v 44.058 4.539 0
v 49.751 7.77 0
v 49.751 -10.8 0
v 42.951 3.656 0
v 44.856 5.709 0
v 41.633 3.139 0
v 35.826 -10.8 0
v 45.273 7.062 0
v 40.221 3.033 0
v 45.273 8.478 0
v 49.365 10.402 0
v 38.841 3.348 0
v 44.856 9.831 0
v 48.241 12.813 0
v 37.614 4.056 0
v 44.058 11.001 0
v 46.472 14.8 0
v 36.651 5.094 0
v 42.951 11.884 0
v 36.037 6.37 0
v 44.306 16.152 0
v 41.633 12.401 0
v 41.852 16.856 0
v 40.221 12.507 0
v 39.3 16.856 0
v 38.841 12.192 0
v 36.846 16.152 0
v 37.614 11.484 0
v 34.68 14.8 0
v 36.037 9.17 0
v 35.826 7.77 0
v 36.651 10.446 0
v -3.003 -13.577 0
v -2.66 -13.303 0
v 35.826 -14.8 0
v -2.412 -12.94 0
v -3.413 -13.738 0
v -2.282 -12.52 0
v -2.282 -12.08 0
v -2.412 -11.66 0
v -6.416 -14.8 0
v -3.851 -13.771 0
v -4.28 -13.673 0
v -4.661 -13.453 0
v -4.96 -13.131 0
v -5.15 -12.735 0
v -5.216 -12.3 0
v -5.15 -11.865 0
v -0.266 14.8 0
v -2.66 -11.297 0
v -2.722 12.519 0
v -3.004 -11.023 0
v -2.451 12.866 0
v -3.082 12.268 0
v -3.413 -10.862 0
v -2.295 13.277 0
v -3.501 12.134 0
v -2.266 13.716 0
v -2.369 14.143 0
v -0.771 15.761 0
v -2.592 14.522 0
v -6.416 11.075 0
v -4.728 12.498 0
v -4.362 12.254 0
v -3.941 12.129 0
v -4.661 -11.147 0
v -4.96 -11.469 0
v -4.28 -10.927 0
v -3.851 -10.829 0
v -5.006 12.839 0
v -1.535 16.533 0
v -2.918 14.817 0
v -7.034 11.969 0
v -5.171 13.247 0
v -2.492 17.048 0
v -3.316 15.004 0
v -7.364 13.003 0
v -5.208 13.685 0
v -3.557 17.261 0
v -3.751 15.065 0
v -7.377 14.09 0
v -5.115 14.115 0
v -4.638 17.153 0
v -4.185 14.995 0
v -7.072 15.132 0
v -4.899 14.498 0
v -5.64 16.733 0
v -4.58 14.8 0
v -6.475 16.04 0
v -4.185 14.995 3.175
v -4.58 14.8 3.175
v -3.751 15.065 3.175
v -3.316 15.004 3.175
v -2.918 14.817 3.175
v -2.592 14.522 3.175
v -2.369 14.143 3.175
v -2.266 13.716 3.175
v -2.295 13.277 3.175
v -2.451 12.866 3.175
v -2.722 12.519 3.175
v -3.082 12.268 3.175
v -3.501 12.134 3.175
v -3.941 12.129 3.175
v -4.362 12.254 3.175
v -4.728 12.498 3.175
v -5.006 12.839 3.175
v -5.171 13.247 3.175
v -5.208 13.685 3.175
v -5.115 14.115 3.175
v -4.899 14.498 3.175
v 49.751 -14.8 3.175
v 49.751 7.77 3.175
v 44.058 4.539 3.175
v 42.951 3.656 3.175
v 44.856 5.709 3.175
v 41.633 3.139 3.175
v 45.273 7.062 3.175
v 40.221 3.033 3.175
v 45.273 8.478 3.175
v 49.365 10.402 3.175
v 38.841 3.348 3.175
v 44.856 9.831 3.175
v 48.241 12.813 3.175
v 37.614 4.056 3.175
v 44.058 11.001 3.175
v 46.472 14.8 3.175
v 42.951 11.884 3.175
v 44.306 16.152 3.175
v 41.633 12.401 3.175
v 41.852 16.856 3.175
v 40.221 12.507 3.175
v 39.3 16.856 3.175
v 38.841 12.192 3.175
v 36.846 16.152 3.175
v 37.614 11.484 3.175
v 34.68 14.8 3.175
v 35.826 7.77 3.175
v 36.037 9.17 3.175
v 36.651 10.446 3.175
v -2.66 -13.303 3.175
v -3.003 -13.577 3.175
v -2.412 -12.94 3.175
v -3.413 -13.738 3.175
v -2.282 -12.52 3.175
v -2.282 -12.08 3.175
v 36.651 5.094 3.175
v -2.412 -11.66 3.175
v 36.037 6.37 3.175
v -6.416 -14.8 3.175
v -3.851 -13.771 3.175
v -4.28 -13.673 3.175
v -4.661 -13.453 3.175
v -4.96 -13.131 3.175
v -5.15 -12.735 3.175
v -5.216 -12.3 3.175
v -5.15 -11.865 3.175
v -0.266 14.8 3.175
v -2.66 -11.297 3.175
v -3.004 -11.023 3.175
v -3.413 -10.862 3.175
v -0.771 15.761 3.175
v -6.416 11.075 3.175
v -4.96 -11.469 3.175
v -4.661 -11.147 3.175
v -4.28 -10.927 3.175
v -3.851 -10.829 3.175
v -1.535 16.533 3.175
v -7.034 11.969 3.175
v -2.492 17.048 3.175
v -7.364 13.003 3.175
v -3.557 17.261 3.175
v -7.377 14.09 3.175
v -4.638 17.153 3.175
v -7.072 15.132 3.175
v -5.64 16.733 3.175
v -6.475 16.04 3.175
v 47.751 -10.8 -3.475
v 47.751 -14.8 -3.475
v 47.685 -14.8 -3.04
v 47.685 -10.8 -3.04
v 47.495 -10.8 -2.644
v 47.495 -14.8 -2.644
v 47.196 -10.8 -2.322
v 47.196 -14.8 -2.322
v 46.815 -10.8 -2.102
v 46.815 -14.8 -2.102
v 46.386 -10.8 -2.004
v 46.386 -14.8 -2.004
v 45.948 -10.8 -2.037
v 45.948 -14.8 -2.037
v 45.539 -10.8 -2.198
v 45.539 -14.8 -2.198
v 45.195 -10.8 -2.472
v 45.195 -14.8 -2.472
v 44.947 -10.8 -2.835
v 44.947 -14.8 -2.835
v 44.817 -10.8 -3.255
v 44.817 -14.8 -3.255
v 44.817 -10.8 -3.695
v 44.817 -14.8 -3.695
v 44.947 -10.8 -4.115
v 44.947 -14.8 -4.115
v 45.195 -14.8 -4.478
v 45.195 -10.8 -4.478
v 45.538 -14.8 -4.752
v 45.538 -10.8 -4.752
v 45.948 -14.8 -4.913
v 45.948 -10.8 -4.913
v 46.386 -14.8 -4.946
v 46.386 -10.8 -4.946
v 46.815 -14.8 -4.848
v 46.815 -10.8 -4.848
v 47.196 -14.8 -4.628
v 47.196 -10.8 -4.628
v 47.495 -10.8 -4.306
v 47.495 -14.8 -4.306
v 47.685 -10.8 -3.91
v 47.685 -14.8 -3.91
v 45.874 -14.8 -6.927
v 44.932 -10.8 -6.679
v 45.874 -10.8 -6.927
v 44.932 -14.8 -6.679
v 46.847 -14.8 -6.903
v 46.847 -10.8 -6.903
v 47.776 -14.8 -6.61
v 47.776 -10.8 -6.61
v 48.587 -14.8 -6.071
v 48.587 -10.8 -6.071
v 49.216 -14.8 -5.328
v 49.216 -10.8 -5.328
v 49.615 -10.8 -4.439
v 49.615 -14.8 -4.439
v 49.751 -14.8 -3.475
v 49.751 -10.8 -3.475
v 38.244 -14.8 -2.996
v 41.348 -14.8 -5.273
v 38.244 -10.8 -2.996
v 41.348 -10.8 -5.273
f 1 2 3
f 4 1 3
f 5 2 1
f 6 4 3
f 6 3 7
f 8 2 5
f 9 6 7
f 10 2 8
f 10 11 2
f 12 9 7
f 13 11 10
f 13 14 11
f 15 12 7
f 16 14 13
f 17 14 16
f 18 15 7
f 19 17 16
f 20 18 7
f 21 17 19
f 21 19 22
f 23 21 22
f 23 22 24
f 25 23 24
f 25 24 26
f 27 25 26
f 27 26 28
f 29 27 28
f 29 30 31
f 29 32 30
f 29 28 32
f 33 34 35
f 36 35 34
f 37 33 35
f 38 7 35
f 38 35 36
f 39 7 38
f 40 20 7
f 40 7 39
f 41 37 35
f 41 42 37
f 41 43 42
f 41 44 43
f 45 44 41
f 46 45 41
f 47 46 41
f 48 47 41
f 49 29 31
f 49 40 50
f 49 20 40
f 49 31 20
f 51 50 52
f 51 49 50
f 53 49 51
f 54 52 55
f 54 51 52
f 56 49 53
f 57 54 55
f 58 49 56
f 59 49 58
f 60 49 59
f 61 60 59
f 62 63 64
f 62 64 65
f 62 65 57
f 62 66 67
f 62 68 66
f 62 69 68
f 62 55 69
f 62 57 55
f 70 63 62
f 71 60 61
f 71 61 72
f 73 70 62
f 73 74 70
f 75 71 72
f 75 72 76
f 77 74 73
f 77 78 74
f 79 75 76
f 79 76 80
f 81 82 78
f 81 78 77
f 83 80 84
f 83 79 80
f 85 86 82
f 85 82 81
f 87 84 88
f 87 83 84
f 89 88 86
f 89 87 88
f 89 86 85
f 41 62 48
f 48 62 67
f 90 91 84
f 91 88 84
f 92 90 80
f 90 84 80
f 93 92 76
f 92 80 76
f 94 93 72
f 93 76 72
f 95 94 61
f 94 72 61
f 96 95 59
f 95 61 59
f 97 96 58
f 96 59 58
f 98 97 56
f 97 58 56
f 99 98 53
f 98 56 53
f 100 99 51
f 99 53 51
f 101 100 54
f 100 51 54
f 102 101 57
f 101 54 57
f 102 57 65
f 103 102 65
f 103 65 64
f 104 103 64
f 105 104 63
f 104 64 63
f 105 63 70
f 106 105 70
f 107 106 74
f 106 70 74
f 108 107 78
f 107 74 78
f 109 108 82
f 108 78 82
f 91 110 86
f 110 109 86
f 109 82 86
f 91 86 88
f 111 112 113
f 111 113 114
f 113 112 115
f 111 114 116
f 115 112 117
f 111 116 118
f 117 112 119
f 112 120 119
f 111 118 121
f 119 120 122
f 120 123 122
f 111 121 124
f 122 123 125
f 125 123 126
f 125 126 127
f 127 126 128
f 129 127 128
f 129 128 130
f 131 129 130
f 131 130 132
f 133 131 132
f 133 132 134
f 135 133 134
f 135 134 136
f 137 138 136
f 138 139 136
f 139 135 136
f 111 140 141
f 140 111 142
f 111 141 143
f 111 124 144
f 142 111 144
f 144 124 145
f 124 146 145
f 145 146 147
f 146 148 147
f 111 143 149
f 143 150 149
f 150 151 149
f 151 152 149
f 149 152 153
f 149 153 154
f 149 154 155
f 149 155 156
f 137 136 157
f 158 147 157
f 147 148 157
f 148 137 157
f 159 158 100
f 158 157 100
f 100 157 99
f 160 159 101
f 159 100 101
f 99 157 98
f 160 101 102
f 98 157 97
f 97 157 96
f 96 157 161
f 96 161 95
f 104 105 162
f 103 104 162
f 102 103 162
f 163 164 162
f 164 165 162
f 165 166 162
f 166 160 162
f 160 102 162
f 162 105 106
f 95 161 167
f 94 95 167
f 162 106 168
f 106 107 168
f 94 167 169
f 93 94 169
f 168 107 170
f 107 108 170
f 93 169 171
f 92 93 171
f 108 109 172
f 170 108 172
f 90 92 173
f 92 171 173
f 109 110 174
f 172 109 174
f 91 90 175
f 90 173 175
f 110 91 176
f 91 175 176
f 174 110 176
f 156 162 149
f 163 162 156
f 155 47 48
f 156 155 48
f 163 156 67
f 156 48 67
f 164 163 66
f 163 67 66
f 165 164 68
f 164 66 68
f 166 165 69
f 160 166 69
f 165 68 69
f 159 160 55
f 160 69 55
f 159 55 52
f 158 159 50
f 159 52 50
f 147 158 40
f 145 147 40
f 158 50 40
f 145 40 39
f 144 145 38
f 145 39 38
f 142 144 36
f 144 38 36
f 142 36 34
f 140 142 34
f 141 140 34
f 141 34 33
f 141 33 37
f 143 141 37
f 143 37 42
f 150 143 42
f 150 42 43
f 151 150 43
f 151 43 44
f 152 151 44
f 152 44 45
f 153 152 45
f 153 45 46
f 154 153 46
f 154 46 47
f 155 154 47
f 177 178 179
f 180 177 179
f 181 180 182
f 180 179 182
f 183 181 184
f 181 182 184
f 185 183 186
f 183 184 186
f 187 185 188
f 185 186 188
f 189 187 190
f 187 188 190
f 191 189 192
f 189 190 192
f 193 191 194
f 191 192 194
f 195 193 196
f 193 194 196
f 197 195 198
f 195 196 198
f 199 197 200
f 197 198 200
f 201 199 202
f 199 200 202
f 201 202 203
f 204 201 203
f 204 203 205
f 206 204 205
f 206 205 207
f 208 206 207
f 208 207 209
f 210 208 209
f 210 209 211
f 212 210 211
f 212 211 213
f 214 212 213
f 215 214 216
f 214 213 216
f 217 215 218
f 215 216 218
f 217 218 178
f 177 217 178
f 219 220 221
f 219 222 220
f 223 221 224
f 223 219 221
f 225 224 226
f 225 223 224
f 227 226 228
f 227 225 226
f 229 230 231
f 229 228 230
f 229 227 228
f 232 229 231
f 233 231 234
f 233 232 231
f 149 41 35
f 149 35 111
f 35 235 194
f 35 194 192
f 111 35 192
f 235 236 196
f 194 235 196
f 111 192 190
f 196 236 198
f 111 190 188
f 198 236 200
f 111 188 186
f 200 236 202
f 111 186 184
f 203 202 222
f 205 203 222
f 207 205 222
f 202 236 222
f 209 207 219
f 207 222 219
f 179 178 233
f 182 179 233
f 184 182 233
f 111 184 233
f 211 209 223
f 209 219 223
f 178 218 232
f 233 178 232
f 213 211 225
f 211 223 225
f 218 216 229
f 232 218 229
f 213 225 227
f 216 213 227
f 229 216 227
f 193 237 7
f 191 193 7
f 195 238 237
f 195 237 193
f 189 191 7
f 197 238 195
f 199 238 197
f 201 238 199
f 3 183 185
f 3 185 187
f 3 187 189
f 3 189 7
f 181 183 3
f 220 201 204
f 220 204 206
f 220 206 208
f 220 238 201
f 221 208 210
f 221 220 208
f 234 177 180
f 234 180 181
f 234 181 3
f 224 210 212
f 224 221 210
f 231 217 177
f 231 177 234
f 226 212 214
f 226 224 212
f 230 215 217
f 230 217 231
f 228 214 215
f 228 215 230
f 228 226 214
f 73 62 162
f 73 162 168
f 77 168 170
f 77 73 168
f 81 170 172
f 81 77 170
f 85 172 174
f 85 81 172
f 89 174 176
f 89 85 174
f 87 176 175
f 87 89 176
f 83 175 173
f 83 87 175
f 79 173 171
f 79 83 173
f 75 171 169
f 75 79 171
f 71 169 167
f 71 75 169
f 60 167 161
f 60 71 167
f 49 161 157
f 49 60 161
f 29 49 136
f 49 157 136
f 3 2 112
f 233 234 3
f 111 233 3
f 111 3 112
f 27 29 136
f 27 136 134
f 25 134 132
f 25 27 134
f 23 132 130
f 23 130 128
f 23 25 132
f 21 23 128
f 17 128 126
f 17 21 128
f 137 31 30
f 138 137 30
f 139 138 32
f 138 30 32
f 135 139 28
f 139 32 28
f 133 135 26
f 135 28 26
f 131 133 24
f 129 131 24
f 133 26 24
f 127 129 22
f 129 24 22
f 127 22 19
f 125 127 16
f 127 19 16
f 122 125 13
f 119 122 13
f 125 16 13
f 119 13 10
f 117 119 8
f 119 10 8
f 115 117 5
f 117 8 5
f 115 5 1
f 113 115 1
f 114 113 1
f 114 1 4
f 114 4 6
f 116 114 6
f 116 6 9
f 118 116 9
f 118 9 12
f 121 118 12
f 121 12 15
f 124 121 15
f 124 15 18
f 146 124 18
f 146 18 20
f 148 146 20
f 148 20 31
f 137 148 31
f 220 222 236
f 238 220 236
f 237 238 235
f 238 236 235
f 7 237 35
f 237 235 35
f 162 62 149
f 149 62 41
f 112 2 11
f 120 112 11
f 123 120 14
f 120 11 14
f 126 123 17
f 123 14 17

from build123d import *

# Parameters (mm, degrees)
SKETCH1_W            = 6.266
SKETCH1_H            = 19.6
SKETCH1_R            = 1.675
SKETCH1_W_2          = 52.832
SKETCH1_H_2          = 5
BOSS_EXTRUDE2_DEPTH  = 3.175
SKETCH3_W            = 30
SKETCH3_H            = 29.6
BOSS_EXTRUDE3_DEPTH  = 3.175
SKETCH4_R            = 4.75
CUT_EXTRUDE1_DEPTH   = 10
BOSS_EXTRUDE14_DEPTH = 3.175
CUT_EXTRUDE8_DEPTH   = 10
SKETCH24_R           = 1.675
CUT_EXTRUDE9_DEPTH   = 10
SKETCH25_R           = 3.675
SKETCH25_R_2         = 1.675
BOSS_EXTRUDE15_DEPTH = 3.175
SKETCH27_W           = 52.932563224
SKETCH27_H           = 23.005559857
BOSS_EXTRUDE16_DEPTH = 3.175
CUT_EXTRUDE14_DEPTH  = 10
SKETCH29_R           = 1.675
CUT_EXTRUDE15_DEPTH  = 10
SKETCH30_R           = 1.475
CUT_EXTRUDE16_DEPTH  = 10
SKETCH31_R           = 3.675
SKETCH31_R_2         = 1.675
BOSS_EXTRUDE17_DEPTH = 3.175
SKETCH33_R           = 1.475
CUT_EXTRUDE17_DEPTH  = 53.757206626
SKETCH37_R           = 3.475
SKETCH37_R_2         = 1.475
BOSS_EXTRUDE21_DEPTH = 4
BOSS_EXTRUDE22_DEPTH = 4
SKETCH39_R           = 1.675
SKETCH39_R_2         = 1.475
BOSS_EXTRUDE23_DEPTH = 3.175


with BuildPart() as part:
    # Sketch1 → Boss-Extrude2 (new body)
    # profile 1 of 4: a face of its own
    with BuildSketch(Plane.XY):
        with Locations((-23.283, 0)):
            Rectangle(SKETCH1_W, SKETCH1_H)
        with Locations((-23.95, -4.974)):
            Circle(SKETCH1_R, mode=Mode.SUBTRACT)
        with Locations((-23.95, 4.974)):
            Circle(SKETCH1_R, mode=Mode.SUBTRACT)
    # profile 2 of 4: a face of its own
    with BuildSketch(Plane.XY):
        with Locations((0, -12.3)):
            Rectangle(SKETCH1_W_2, SKETCH1_H_2)
    # profile 3 of 4: a face of its own
    with BuildSketch(Plane.XY):
        with Locations((0, 12.3)):
            Rectangle(SKETCH1_W_2, SKETCH1_H_2)
    # profile 4 of 4: a face of its own
    with BuildSketch(Plane.XY):
        with Locations((23.283, 0)):
            Rectangle(SKETCH1_W, SKETCH1_H)
        with Locations((23.95, -4.974)):
            Circle(SKETCH1_R, mode=Mode.SUBTRACT)
        with Locations((23.95, 4.974)):
            Circle(SKETCH1_R, mode=Mode.SUBTRACT)
    extrude(amount=BOSS_EXTRUDE2_DEPTH)

    # Sketch3 → Boss-Extrude3 (add)
    with BuildSketch(Plane.XY.offset(3.175)):
        with Locations((41.416, 0)):
            Rectangle(SKETCH3_W, SKETCH3_H)
    extrude(amount=-BOSS_EXTRUDE3_DEPTH)

    # Sketch4 → Cut-Extrude1 (cut)
    with BuildSketch(Plane(origin=(0, 0, 0), x_dir=(-1, 0, 0), z_dir=(0, 0, -1))):
        with Locations((-40.576, 7.77)):
            Circle(SKETCH4_R)
    extrude(amount=-CUT_EXTRUDE1_DEPTH, mode=Mode.SUBTRACT)

    # Sketch22 → Boss-Extrude14 (add)
    with BuildSketch(Plane(origin=(0, 0, 0), x_dir=(-1, 0, 0), z_dir=(0, 0, -1))):
        with BuildLine():
            ThreePointArc((-34.680262133, 14.8), (-40.576, 16.945), (-46.471737867, 14.8))
            Line((-46.471737867, 14.8), (-34.680262133, 14.8))
        make_face()
    extrude(amount=-BOSS_EXTRUDE14_DEPTH)

    # Sketch23 → Cut-Extrude8 (cut)
    with BuildSketch(Plane(origin=(0, 0, 0), x_dir=(-1, 0, 0), z_dir=(0, 0, -1))):
        with BuildLine():
            Line((-49.751, -14.8), (-49.751, 7.77))
            ThreePointArc((-49.751, 7.77), (-48.890866804, 11.648609936), (-46.471737867, 14.8))
            Line((-46.471737867, 14.8), (-56.416, 14.8))
            Line((-56.416, 14.8), (-56.416, -14.8))
            Line((-56.416, -14.8), (-49.751, -14.8))
        make_face()
    extrude(amount=-CUT_EXTRUDE8_DEPTH, mode=Mode.SUBTRACT)

    # Sketch24 → Cut-Extrude9 (cut)
    with BuildSketch(Plane(origin=(0, 0, 0), x_dir=(-1, 0, 0), z_dir=(0, 0, -1))):
        with Locations((23.736, 13.59)):
            Circle(SKETCH24_R)
    extrude(amount=-CUT_EXTRUDE9_DEPTH, mode=Mode.SUBTRACT)

    # Sketch25 → Boss-Extrude15 (add)
    # profile 1 of 3: a face of its own
    with BuildSketch(Plane(origin=(0, 0, 0), x_dir=(-1, 0, 0), z_dir=(0, 0, -1))):
        with Locations((23.95, -4.974)):
            Circle(SKETCH25_R)
        with Locations(Location((23.95, -4.974, 0), (0, 0, 180))):
            Circle(SKETCH25_R_2, mode=Mode.SUBTRACT)
    # profile 2 of 3: a face of its own
    with BuildSketch(Plane(origin=(0, 0, 0), x_dir=(-1, 0, 0), z_dir=(0, 0, -1))):
        with Locations((23.95, 4.974)):
            Circle(SKETCH25_R)
        with Locations(Location((23.95, 4.974, 0), (0, 0, 180))):
            Circle(SKETCH25_R_2, mode=Mode.SUBTRACT)
    # profile 3 of 3: a face of its own
    with BuildSketch(Plane(origin=(0, 0, 0), x_dir=(-1, 0, 0), z_dir=(0, 0, -1))):
        with Locations((23.736, 13.59)):
            Circle(SKETCH25_R)
        with Locations((23.736, 13.59)):
            Circle(SKETCH25_R_2, mode=Mode.SUBTRACT)
    extrude(amount=-BOSS_EXTRUDE15_DEPTH)

    # Sketch27 → Boss-Extrude16 (add)
    with BuildSketch(Plane(origin=(0, 0, 0), x_dir=(-1, 0, 0), z_dir=(0, 0, -1))):
        with Locations((-0.417160697, -0.481381251)):
            Rectangle(SKETCH27_W, SKETCH27_H)
    extrude(amount=-BOSS_EXTRUDE16_DEPTH)

    # Sketch28 → Cut-Extrude14 (cut)
    with BuildSketch(Plane(origin=(0, 0, 0), x_dir=(-1, 0, 0), z_dir=(0, 0, -1))):
        Polygon((26.416, 8.97792488), (26.416, -8.885991227), (33.695668031, -3.414754928), align=None)
    extrude(amount=-CUT_EXTRUDE14_DEPTH, mode=Mode.SUBTRACT)

    # Sketch29 → Cut-Extrude15 (cut)
    # profile 1 of 4: a face of its own
    with BuildSketch(Plane(origin=(0, 0, 0), x_dir=(-1, 0, 0), z_dir=(0, 0, -1))):
        with BuildLine():
            Line((6.416, -14.8), (26.416, -14.8))
            Line((26.416, -14.8), (26.416, 8.759294646))
            Line((26.416, 8.759294646), (26.416, 11.075397646))
            Line((26.416, 11.075397646), (26.416, 16.104602354))
            ThreePointArc((26.416, 16.104602354), (22.973400892, 17.185005925), (20.265909944, 14.8))
            Line((20.265909944, 14.8), (6.416, 14.8))
            Line((6.416, 14.8), (6.416, -14.8))
        make_face()
        with Locations((23.736, 13.59)):
            Circle(SKETCH29_R, mode=Mode.SUBTRACT)
    # profile 2 of 4: a face of its own
    with BuildSketch(Plane(origin=(0, 0, 0), x_dir=(-1, 0, 0), z_dir=(0, 0, -1))):
        with BuildLine():
            Line((26.416, 11.075397646), (26.416, 8.759294646))
            Line((26.416, 8.759294646), (29.849387413, 8.759294646))
            Line((29.849387413, 8.759294646), (29.849387413, 20.986227432))
            Line((29.849387413, 20.986227432), (26.416, 20.986227432))
            Line((26.416, 20.986227432), (26.416, 16.104602354))
            ThreePointArc((26.416, 16.104602354), (27.411, 13.59), (26.416, 11.075397646))
        make_face()
    # profile 3 of 4: a face of its own
    with BuildSketch(Plane(origin=(0, 0, 0), x_dir=(-1, 0, 0), z_dir=(0, 0, -1))):
        with BuildLine():
            Line((26.416, 16.104602354), (26.416, 11.075397646))
            ThreePointArc((26.416, 11.075397646), (27.411, 13.59), (26.416, 16.104602354))
        make_face()
    # profile 4 of 4: a face of its own
    with BuildSketch(Plane(origin=(0, 0, 0), x_dir=(-1, 0, 0), z_dir=(0, 0, -1))):
        with BuildLine():
            Line((6.416, 20.986227432), (6.416, 14.8))
            Line((6.416, 14.8), (20.265909944, 14.8))
            ThreePointArc((20.265909944, 14.8), (22.973400892, 17.185005925), (26.416, 16.104602354))
            Line((26.416, 16.104602354), (26.416, 20.986227432))
            Line((26.416, 20.986227432), (6.416, 20.986227432))
        make_face()
    extrude(amount=-CUT_EXTRUDE15_DEPTH, mode=Mode.SUBTRACT)

    # Sketch30 → Cut-Extrude16 (cut)
    with BuildSketch(Plane(origin=(0, 0, 0), x_dir=(-1, 0, 0), z_dir=(0, 0, -1))):
        with Locations((3.736, 13.59)):
            Circle(SKETCH30_R)
    extrude(amount=-CUT_EXTRUDE16_DEPTH, mode=Mode.SUBTRACT)

    # Sketch31 → Boss-Extrude17 (add)
    with BuildSketch(Plane(origin=(0, 0, 0), x_dir=(-1, 0, 0), z_dir=(0, 0, -1))):
        with Locations((3.736, 13.59)):
            Circle(SKETCH31_R)
        with Locations((3.736, 13.59)):
            Circle(SKETCH31_R_2, mode=Mode.SUBTRACT)
    extrude(amount=-BOSS_EXTRUDE17_DEPTH)

    # Sketch33 → Cut-Extrude17 (cut, through all)
    with BuildSketch(Plane(origin=(0, 0, 0), x_dir=(-1, 0, 0), z_dir=(0, 0, -1))):
        with Locations((3.741, -12.3)):
            Circle(SKETCH33_R)
    extrude(amount=-CUT_EXTRUDE17_DEPTH, mode=Mode.SUBTRACT)

    # Sketch37 → Boss-Extrude21 (add)
    # profile 1 of 3: a face of its own
    with BuildSketch(Plane(origin=(0, -14.8, 0), x_dir=(-1, 0, 0), z_dir=(0, -1, 0))):
        with BuildLine():
            ThreePointArc((-46.276, 0), (-48.733196065, 1.017803935), (-49.751, 3.475))
            Line((-49.751, 3.475), (-49.751, 0))
            Line((-49.751, 0), (-46.276, 0))
        make_face()
    # profile 2 of 3: a face of its own
    with BuildSketch(Plane(origin=(0, -14.8, 0), x_dir=(-1, 0, 0), z_dir=(0, -1, 0))):
        with Locations((-46.276, 3.475)):
            Circle(SKETCH37_R)
        with Locations(Location((-46.276, 3.475, 0), (0, 0, 180))):
            Circle(SKETCH37_R_2, mode=Mode.SUBTRACT)
    # profile 3 of 3: a face of its own
    with BuildSketch(Plane(origin=(0, -14.8, 0), x_dir=(-1, 0, 0), z_dir=(0, -1, 0))):
        with BuildLine():
            Line((-42.801, 0), (-42.801, 3.475))
            ThreePointArc((-42.801, 3.475), (-43.818803935, 1.017803935), (-46.276, 0))
            Line((-46.276, 0), (-42.801, 0))
        make_face()
    extrude(amount=-BOSS_EXTRUDE21_DEPTH)

    # Sketch38 → Boss-Extrude22 (add)
    with BuildSketch(Plane(origin=(0, -14.8, 0), x_dir=(-1, 0, 0), z_dir=(0, -1, 0))):
        with BuildLine():
            Line((-35.826, 0), (-42.801, 0))
            Line((-42.801, 0), (-42.801, 3.475))
            Line((-42.801, 3.475), (-46.276, 6.95))
            ThreePointArc((-46.276, 6.95), (-40.28432198, 4.627774865), (-35.826, 0))
        make_face()
    extrude(amount=-BOSS_EXTRUDE22_DEPTH)

    # Sketch39 → Boss-Extrude23 (add)
    with BuildSketch(Plane(origin=(0, 0, 0), x_dir=(-1, 0, 0), z_dir=(0, 0, -1))):
        with Locations((3.736, 13.59)):
            Circle(SKETCH39_R)
        with Locations((3.736, 13.59)):
            Circle(SKETCH39_R_2, mode=Mode.SUBTRACT)
    extrude(amount=-BOSS_EXTRUDE23_DEPTH)


solid = part.part
